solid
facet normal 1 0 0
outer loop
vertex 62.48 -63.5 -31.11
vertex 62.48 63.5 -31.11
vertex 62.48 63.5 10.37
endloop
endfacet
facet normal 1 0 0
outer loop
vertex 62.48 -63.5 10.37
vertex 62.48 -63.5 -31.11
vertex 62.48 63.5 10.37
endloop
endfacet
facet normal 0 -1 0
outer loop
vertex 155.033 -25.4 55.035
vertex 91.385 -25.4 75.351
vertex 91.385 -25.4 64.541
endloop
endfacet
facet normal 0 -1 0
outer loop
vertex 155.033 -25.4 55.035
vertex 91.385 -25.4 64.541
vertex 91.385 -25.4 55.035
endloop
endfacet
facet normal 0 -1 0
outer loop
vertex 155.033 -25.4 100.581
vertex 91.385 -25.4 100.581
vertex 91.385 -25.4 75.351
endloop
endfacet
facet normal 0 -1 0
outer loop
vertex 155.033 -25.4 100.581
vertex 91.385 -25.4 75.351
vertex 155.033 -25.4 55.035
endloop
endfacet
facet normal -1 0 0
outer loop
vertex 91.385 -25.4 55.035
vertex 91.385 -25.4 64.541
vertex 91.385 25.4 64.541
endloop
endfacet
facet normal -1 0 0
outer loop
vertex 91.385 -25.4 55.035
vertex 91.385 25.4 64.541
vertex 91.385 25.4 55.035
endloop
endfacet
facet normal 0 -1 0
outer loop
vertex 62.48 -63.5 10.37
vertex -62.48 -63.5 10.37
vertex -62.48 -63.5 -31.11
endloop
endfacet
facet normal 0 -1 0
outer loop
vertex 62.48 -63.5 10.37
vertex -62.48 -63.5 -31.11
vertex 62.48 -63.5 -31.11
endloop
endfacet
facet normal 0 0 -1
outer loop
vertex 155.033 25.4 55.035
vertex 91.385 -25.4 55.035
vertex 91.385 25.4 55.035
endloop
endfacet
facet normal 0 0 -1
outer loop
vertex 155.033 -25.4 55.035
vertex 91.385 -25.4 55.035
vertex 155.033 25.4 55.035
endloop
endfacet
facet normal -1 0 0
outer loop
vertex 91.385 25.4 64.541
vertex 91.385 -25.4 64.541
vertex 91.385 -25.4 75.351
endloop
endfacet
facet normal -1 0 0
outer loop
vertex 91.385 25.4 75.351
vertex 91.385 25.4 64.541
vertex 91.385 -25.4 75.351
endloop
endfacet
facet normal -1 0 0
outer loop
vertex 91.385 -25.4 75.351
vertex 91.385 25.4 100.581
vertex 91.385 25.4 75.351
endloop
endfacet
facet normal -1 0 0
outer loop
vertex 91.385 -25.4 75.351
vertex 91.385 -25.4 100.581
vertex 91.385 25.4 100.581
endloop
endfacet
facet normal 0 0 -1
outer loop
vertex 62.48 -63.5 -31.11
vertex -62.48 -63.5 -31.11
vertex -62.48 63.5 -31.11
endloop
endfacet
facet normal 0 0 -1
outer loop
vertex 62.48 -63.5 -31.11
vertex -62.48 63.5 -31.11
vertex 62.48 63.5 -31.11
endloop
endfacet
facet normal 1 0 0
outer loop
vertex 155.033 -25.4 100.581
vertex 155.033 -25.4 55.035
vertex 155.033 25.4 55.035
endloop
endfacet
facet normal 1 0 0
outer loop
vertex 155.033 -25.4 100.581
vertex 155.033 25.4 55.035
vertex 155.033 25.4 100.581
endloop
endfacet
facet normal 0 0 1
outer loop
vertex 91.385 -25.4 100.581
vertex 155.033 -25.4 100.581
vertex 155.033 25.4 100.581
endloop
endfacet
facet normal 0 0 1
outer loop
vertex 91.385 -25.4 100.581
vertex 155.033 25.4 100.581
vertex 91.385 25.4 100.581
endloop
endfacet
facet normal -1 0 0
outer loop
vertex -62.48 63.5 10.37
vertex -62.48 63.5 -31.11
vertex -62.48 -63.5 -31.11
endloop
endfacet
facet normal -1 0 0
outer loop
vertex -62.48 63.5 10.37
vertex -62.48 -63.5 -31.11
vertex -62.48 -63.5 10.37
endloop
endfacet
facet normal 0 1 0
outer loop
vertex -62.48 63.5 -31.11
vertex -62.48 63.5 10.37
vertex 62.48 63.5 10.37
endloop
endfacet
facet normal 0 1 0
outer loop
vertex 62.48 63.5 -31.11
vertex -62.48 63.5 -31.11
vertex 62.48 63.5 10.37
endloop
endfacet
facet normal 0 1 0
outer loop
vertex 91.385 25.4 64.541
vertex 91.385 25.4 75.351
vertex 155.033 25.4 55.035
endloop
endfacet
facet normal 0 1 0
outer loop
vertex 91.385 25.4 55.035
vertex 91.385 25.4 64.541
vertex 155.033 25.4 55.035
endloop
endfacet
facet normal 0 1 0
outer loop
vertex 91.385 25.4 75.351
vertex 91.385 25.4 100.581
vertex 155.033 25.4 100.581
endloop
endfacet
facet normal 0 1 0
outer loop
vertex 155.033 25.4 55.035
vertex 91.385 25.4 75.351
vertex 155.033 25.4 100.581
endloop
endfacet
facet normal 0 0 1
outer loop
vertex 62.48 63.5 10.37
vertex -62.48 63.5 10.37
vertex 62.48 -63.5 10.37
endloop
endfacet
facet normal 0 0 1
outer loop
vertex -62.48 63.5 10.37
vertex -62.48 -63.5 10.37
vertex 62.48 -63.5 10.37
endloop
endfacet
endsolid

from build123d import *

# Parameters (mm, degrees)
F0_W     = 124.9604
F0_H     = 41.480301
F1_DEPTH = 63.5
F0_W_2   = 33.762235
F0_H_2   = 10.810844
F2_DEPTH = 25.4


with BuildPart() as f1:
    # F0 (on Front) → F1 (new body, symmetric)
    with BuildSketch(Plane.XZ):
        with Locations((0, -10.3701)):
            Rectangle(F0_W, F0_H)
    extrude(amount=F1_DEPTH, both=True)

    # F0 (on Front) → F2 (join, symmetric)
    with BuildSketch(Plane.XZ):
        with Locations((0, -10.3701)):
            Rectangle(F0_W, F0_H)
        with Locations((108.265715, 69.946056)):
            Rectangle(F0_W_2, F0_H_2)
        Polygon((125.146832, 64.540634), (91.384597, 64.540634), (91.384597, 55.035133), (155.032657, 55.035133), (155.032657, 100.581463), (91.384597, 100.581463), (91.384597, 75.351478), (125.146832, 75.351478), align=None)
    extrude(amount=F2_DEPTH, both=True)


solid = f1.part
